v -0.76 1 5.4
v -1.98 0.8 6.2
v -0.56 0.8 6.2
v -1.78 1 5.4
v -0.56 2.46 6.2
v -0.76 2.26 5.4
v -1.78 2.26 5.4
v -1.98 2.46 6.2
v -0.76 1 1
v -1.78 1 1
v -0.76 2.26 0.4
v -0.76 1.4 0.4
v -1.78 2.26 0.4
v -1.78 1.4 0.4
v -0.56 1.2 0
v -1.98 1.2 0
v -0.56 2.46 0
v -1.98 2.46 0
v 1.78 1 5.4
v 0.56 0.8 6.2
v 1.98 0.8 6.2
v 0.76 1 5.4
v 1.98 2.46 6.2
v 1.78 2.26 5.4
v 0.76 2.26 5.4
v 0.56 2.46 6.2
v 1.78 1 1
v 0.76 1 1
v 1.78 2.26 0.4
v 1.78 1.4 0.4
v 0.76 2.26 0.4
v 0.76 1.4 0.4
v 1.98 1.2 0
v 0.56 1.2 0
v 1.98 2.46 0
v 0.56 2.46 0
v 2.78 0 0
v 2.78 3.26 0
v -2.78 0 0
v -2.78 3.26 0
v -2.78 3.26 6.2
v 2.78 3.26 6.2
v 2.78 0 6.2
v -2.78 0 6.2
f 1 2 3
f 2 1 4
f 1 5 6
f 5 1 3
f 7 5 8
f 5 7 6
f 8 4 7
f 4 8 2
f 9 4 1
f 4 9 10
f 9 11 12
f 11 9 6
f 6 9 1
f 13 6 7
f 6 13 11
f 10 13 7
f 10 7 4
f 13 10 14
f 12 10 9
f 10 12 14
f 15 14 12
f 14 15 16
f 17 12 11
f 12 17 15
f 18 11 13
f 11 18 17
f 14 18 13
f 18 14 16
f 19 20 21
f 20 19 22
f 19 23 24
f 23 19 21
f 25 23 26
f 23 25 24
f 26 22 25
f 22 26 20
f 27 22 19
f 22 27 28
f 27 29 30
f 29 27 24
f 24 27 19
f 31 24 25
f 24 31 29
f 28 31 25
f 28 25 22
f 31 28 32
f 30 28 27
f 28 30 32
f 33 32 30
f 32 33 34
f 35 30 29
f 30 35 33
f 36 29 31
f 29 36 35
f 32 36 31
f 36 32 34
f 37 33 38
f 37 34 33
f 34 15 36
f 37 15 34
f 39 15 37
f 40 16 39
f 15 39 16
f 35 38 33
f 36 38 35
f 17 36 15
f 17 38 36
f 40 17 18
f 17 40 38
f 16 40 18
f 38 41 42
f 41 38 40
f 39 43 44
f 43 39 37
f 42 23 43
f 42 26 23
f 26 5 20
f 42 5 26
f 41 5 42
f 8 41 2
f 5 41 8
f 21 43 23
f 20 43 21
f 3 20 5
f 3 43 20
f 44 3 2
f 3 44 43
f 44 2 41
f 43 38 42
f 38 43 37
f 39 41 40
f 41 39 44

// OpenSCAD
/* Paired pin sleeve V2, millimetres.
   Copyright Daniel Eric Fredriksen / Quantyra.
   SPDX-License-Identifier: CERN-OHL-S-2.0
   Source Location: https://github.com/Quantyra/connectors
   Default export: one enclosed body, vertical bores, jumper end at Z=0.
   User-reported basic functional demonstration: yellow LED works and flashes.
   Colored pins/collars and cutaway removal are inspection views only. */
view = "print"; // print, assembly, cutaway, check_body, check_leds, check_males, check_collars
eps = 0.01;

length = 6.20;
pitch = 2.54;
bore_width = 1.02;
contact_height = 1.26; // 0.12 clearance above nominal touching 0.50+0.64 stack
mouth_ease = 0.20;    // per wall, not total width
wall = 0.80;
led_flare_end = 0.80;
guide_start = 5.20;   // 0.20 beyond the assumed maximum 5.00 straight LED tail
guide_crest = 5.80;
guide_floor = 0.40;   // continuous whole-floor ramp; no separate pressure element

// Inspection assumptions; these do NOT resize the printable body.
actual_led = [0.50, 0.50];
actual_male = [0.64, 0.64];
led_insertions = [4.00, 5.00];
male_exposed = 6.00;
tip_taper = 0.60;
tip_flat = 0.20;
collar_width = 2.54;
collar_length = 4.00; // display only; cross-section is also assumed
jumper_outward_offset = 0.10; // individual jumpers, not a fixed-pitch header
male_standoff = 0;
led_display_extension = 0.80; // identifies entry in images, NOT additional available tail

mouth_width = bore_width + 2*mouth_ease;
pair_width = pitch + mouth_width + 2*wall;
bottom = -mouth_ease-wall;
top = contact_height+mouth_ease+wall;
body_height = top-bottom;
function cy(i) = (i-0.5)*pitch;
function my(i) = cy(i)+(2*i-1)*jumper_outward_offset;

// Stations [axial X, width, lower Z, upper Z]. Each connecting face is a
// continuous planar taper. No transverse shoulder crosses the passage.
stations = [
    [0,             mouth_width, -mouth_ease, contact_height+mouth_ease],
    [led_flare_end,  bore_width,  0,           contact_height],
    [guide_start,    bore_width,  0,           contact_height],
    [guide_crest,    bore_width,  guide_floor, contact_height],
    [length,        mouth_width, guide_floor-mouth_ease, contact_height+mouth_ease]
];

assert(length > guide_crest && guide_crest > guide_start);
assert(guide_start > max(led_insertions));
assert(pitch-mouth_width >= 2*0.4);
assert(wall >= 2*0.4);
assert(contact_height > max([for(i=[0,1]) actual_led[i]+actual_male[i]]),
       "Inspection stack exceeds rigid clearance: do not assume wall flex");

module box(x0,x1,y0,y1,z0,z1) {
    translate([x0,y0,z0]) cube([x1-x0,y1-y0,z1-z0]);
}

module passage(i) {
    // One closed negative polyhedron. End caps lie OUTSIDE the body.
    ss = concat([[-eps, mouth_width, -mouth_ease, contact_height+mouth_ease]],
        stations, [[length+eps, mouth_width, guide_floor-mouth_ease, contact_height+mouth_ease]]);
    pts = [for(s=ss) each [
        [s[0],cy(i)-s[1]/2,s[2]], [s[0],cy(i)+s[1]/2,s[2]],
        [s[0],cy(i)+s[1]/2,s[3]], [s[0],cy(i)-s[1]/2,s[3]]]];
    n = len(ss);
    faces = concat([[3,2,1,0]],
        [for(j=[0:n-2], k=[0:3])
            [4*j+k,4*j+(k+1)%4,4*(j+1)+(k+1)%4,4*(j+1)+k]],
        [[4*(n-1),4*(n-1)+1,4*(n-1)+2,4*(n-1)+3]]);
    polyhedron(points=pts,faces=faces,convexity=10);
}

module sleeve() {
    difference() {
        box(0,length,-pair_width/2,pair_width/2,bottom,top);
        for(i=[0,1]) passage(i);
    }
}

module led(i) {
    box(-led_display_extension,led_insertions[i],cy(i)-actual_led[i]/2,cy(i)+actual_led[i]/2,0,actual_led[i]);
}
module male(i) {
    w = actual_male[i];
    a = length+male_standoff-male_exposed;
    h = actual_led[i]; // deliberately touching pose, NOT enforced by clearance bore
    box(a+tip_taper,length+male_standoff,my(i)-w/2,my(i)+w/2,h,h+w);
    polyhedron(points=[for(s=[[a,tip_flat],[a+tip_taper,w]]) each [
        [s[0],my(i)-s[1]/2,h+(w-s[1])/2], [s[0],my(i)+s[1]/2,h+(w-s[1])/2],
        [s[0],my(i)+s[1]/2,h+(w+s[1])/2], [s[0],my(i)-s[1]/2,h+(w+s[1])/2]]],
        faces=[[3,2,1,0],[0,1,5,4],[1,2,6,5],[2,3,7,6],[3,0,4,7],[4,5,6,7]]);
}
module collars() {
    for(i=[0,1]) box(length+male_standoff,length+male_standoff+collar_length,
        my(i)-collar_width/2,my(i)+collar_width/2,
        actual_led[i]+actual_male[i]/2-collar_width/2,
        actual_led[i]+actual_male[i]/2+collar_width/2);
}
module colored_proxies() {
    for(i=[0,1]) {
        color([1.0,0.58,0.02]) led(i);   // orange/gold: straight LED tails
        color([0.72,0.12,0.67]) male(i); // magenta: opposing male jumpers
    }
    color([0.24,0.26,0.29]) collars();
}
module print_orientation() {
    // [axial X,pitch Y,stack Z] -> [pitch X,stack Z-bottom,length-axial X]
    multmatrix([[0,1,0,0],[0,0,1,-bottom],[-1,0,0,length],[0,0,0,1]]) children();
}

if(view=="print") color([0.12,0.55,0.66]) print_orientation() sleeve();
else if(view=="assembly") {
    color([0.12,0.55,0.66]) sleeve();
    colored_proxies();
}
else if(view=="cutaway") {
    color([0.12,0.55,0.66]) render(convexity=10) difference() {
        sleeve();
        // Display-only longitudinal section through each pin pair.
        for(i=[0,1]) box(-eps,length+eps,i==0 ? -pair_width/2-eps : 0,cy(i),bottom-eps,top+eps);
    }
    colored_proxies();
}
else if(view=="check_body") sleeve();
else if(view=="check_leds") for(i=[0,1]) led(i);
else if(view=="check_males") for(i=[0,1]) male(i);
else if(view=="check_collars") collars();
else assert(false,"Unknown view");

echo(body=[pair_width,body_height,length], common_bore=[bore_width,contact_height],
     led_mouth=[mouth_width,contact_height+2*mouth_ease],
     male_mouth=[mouth_width,contact_height-guide_floor+2*mouth_ease],
     male_guide=[bore_width,contact_height-guide_floor],
     nose=length+male_standoff-male_exposed,
     full_section_overlap=[for(i=[0,1]) led_insertions[i]-(length+male_standoff-male_exposed+tip_taper)]);
